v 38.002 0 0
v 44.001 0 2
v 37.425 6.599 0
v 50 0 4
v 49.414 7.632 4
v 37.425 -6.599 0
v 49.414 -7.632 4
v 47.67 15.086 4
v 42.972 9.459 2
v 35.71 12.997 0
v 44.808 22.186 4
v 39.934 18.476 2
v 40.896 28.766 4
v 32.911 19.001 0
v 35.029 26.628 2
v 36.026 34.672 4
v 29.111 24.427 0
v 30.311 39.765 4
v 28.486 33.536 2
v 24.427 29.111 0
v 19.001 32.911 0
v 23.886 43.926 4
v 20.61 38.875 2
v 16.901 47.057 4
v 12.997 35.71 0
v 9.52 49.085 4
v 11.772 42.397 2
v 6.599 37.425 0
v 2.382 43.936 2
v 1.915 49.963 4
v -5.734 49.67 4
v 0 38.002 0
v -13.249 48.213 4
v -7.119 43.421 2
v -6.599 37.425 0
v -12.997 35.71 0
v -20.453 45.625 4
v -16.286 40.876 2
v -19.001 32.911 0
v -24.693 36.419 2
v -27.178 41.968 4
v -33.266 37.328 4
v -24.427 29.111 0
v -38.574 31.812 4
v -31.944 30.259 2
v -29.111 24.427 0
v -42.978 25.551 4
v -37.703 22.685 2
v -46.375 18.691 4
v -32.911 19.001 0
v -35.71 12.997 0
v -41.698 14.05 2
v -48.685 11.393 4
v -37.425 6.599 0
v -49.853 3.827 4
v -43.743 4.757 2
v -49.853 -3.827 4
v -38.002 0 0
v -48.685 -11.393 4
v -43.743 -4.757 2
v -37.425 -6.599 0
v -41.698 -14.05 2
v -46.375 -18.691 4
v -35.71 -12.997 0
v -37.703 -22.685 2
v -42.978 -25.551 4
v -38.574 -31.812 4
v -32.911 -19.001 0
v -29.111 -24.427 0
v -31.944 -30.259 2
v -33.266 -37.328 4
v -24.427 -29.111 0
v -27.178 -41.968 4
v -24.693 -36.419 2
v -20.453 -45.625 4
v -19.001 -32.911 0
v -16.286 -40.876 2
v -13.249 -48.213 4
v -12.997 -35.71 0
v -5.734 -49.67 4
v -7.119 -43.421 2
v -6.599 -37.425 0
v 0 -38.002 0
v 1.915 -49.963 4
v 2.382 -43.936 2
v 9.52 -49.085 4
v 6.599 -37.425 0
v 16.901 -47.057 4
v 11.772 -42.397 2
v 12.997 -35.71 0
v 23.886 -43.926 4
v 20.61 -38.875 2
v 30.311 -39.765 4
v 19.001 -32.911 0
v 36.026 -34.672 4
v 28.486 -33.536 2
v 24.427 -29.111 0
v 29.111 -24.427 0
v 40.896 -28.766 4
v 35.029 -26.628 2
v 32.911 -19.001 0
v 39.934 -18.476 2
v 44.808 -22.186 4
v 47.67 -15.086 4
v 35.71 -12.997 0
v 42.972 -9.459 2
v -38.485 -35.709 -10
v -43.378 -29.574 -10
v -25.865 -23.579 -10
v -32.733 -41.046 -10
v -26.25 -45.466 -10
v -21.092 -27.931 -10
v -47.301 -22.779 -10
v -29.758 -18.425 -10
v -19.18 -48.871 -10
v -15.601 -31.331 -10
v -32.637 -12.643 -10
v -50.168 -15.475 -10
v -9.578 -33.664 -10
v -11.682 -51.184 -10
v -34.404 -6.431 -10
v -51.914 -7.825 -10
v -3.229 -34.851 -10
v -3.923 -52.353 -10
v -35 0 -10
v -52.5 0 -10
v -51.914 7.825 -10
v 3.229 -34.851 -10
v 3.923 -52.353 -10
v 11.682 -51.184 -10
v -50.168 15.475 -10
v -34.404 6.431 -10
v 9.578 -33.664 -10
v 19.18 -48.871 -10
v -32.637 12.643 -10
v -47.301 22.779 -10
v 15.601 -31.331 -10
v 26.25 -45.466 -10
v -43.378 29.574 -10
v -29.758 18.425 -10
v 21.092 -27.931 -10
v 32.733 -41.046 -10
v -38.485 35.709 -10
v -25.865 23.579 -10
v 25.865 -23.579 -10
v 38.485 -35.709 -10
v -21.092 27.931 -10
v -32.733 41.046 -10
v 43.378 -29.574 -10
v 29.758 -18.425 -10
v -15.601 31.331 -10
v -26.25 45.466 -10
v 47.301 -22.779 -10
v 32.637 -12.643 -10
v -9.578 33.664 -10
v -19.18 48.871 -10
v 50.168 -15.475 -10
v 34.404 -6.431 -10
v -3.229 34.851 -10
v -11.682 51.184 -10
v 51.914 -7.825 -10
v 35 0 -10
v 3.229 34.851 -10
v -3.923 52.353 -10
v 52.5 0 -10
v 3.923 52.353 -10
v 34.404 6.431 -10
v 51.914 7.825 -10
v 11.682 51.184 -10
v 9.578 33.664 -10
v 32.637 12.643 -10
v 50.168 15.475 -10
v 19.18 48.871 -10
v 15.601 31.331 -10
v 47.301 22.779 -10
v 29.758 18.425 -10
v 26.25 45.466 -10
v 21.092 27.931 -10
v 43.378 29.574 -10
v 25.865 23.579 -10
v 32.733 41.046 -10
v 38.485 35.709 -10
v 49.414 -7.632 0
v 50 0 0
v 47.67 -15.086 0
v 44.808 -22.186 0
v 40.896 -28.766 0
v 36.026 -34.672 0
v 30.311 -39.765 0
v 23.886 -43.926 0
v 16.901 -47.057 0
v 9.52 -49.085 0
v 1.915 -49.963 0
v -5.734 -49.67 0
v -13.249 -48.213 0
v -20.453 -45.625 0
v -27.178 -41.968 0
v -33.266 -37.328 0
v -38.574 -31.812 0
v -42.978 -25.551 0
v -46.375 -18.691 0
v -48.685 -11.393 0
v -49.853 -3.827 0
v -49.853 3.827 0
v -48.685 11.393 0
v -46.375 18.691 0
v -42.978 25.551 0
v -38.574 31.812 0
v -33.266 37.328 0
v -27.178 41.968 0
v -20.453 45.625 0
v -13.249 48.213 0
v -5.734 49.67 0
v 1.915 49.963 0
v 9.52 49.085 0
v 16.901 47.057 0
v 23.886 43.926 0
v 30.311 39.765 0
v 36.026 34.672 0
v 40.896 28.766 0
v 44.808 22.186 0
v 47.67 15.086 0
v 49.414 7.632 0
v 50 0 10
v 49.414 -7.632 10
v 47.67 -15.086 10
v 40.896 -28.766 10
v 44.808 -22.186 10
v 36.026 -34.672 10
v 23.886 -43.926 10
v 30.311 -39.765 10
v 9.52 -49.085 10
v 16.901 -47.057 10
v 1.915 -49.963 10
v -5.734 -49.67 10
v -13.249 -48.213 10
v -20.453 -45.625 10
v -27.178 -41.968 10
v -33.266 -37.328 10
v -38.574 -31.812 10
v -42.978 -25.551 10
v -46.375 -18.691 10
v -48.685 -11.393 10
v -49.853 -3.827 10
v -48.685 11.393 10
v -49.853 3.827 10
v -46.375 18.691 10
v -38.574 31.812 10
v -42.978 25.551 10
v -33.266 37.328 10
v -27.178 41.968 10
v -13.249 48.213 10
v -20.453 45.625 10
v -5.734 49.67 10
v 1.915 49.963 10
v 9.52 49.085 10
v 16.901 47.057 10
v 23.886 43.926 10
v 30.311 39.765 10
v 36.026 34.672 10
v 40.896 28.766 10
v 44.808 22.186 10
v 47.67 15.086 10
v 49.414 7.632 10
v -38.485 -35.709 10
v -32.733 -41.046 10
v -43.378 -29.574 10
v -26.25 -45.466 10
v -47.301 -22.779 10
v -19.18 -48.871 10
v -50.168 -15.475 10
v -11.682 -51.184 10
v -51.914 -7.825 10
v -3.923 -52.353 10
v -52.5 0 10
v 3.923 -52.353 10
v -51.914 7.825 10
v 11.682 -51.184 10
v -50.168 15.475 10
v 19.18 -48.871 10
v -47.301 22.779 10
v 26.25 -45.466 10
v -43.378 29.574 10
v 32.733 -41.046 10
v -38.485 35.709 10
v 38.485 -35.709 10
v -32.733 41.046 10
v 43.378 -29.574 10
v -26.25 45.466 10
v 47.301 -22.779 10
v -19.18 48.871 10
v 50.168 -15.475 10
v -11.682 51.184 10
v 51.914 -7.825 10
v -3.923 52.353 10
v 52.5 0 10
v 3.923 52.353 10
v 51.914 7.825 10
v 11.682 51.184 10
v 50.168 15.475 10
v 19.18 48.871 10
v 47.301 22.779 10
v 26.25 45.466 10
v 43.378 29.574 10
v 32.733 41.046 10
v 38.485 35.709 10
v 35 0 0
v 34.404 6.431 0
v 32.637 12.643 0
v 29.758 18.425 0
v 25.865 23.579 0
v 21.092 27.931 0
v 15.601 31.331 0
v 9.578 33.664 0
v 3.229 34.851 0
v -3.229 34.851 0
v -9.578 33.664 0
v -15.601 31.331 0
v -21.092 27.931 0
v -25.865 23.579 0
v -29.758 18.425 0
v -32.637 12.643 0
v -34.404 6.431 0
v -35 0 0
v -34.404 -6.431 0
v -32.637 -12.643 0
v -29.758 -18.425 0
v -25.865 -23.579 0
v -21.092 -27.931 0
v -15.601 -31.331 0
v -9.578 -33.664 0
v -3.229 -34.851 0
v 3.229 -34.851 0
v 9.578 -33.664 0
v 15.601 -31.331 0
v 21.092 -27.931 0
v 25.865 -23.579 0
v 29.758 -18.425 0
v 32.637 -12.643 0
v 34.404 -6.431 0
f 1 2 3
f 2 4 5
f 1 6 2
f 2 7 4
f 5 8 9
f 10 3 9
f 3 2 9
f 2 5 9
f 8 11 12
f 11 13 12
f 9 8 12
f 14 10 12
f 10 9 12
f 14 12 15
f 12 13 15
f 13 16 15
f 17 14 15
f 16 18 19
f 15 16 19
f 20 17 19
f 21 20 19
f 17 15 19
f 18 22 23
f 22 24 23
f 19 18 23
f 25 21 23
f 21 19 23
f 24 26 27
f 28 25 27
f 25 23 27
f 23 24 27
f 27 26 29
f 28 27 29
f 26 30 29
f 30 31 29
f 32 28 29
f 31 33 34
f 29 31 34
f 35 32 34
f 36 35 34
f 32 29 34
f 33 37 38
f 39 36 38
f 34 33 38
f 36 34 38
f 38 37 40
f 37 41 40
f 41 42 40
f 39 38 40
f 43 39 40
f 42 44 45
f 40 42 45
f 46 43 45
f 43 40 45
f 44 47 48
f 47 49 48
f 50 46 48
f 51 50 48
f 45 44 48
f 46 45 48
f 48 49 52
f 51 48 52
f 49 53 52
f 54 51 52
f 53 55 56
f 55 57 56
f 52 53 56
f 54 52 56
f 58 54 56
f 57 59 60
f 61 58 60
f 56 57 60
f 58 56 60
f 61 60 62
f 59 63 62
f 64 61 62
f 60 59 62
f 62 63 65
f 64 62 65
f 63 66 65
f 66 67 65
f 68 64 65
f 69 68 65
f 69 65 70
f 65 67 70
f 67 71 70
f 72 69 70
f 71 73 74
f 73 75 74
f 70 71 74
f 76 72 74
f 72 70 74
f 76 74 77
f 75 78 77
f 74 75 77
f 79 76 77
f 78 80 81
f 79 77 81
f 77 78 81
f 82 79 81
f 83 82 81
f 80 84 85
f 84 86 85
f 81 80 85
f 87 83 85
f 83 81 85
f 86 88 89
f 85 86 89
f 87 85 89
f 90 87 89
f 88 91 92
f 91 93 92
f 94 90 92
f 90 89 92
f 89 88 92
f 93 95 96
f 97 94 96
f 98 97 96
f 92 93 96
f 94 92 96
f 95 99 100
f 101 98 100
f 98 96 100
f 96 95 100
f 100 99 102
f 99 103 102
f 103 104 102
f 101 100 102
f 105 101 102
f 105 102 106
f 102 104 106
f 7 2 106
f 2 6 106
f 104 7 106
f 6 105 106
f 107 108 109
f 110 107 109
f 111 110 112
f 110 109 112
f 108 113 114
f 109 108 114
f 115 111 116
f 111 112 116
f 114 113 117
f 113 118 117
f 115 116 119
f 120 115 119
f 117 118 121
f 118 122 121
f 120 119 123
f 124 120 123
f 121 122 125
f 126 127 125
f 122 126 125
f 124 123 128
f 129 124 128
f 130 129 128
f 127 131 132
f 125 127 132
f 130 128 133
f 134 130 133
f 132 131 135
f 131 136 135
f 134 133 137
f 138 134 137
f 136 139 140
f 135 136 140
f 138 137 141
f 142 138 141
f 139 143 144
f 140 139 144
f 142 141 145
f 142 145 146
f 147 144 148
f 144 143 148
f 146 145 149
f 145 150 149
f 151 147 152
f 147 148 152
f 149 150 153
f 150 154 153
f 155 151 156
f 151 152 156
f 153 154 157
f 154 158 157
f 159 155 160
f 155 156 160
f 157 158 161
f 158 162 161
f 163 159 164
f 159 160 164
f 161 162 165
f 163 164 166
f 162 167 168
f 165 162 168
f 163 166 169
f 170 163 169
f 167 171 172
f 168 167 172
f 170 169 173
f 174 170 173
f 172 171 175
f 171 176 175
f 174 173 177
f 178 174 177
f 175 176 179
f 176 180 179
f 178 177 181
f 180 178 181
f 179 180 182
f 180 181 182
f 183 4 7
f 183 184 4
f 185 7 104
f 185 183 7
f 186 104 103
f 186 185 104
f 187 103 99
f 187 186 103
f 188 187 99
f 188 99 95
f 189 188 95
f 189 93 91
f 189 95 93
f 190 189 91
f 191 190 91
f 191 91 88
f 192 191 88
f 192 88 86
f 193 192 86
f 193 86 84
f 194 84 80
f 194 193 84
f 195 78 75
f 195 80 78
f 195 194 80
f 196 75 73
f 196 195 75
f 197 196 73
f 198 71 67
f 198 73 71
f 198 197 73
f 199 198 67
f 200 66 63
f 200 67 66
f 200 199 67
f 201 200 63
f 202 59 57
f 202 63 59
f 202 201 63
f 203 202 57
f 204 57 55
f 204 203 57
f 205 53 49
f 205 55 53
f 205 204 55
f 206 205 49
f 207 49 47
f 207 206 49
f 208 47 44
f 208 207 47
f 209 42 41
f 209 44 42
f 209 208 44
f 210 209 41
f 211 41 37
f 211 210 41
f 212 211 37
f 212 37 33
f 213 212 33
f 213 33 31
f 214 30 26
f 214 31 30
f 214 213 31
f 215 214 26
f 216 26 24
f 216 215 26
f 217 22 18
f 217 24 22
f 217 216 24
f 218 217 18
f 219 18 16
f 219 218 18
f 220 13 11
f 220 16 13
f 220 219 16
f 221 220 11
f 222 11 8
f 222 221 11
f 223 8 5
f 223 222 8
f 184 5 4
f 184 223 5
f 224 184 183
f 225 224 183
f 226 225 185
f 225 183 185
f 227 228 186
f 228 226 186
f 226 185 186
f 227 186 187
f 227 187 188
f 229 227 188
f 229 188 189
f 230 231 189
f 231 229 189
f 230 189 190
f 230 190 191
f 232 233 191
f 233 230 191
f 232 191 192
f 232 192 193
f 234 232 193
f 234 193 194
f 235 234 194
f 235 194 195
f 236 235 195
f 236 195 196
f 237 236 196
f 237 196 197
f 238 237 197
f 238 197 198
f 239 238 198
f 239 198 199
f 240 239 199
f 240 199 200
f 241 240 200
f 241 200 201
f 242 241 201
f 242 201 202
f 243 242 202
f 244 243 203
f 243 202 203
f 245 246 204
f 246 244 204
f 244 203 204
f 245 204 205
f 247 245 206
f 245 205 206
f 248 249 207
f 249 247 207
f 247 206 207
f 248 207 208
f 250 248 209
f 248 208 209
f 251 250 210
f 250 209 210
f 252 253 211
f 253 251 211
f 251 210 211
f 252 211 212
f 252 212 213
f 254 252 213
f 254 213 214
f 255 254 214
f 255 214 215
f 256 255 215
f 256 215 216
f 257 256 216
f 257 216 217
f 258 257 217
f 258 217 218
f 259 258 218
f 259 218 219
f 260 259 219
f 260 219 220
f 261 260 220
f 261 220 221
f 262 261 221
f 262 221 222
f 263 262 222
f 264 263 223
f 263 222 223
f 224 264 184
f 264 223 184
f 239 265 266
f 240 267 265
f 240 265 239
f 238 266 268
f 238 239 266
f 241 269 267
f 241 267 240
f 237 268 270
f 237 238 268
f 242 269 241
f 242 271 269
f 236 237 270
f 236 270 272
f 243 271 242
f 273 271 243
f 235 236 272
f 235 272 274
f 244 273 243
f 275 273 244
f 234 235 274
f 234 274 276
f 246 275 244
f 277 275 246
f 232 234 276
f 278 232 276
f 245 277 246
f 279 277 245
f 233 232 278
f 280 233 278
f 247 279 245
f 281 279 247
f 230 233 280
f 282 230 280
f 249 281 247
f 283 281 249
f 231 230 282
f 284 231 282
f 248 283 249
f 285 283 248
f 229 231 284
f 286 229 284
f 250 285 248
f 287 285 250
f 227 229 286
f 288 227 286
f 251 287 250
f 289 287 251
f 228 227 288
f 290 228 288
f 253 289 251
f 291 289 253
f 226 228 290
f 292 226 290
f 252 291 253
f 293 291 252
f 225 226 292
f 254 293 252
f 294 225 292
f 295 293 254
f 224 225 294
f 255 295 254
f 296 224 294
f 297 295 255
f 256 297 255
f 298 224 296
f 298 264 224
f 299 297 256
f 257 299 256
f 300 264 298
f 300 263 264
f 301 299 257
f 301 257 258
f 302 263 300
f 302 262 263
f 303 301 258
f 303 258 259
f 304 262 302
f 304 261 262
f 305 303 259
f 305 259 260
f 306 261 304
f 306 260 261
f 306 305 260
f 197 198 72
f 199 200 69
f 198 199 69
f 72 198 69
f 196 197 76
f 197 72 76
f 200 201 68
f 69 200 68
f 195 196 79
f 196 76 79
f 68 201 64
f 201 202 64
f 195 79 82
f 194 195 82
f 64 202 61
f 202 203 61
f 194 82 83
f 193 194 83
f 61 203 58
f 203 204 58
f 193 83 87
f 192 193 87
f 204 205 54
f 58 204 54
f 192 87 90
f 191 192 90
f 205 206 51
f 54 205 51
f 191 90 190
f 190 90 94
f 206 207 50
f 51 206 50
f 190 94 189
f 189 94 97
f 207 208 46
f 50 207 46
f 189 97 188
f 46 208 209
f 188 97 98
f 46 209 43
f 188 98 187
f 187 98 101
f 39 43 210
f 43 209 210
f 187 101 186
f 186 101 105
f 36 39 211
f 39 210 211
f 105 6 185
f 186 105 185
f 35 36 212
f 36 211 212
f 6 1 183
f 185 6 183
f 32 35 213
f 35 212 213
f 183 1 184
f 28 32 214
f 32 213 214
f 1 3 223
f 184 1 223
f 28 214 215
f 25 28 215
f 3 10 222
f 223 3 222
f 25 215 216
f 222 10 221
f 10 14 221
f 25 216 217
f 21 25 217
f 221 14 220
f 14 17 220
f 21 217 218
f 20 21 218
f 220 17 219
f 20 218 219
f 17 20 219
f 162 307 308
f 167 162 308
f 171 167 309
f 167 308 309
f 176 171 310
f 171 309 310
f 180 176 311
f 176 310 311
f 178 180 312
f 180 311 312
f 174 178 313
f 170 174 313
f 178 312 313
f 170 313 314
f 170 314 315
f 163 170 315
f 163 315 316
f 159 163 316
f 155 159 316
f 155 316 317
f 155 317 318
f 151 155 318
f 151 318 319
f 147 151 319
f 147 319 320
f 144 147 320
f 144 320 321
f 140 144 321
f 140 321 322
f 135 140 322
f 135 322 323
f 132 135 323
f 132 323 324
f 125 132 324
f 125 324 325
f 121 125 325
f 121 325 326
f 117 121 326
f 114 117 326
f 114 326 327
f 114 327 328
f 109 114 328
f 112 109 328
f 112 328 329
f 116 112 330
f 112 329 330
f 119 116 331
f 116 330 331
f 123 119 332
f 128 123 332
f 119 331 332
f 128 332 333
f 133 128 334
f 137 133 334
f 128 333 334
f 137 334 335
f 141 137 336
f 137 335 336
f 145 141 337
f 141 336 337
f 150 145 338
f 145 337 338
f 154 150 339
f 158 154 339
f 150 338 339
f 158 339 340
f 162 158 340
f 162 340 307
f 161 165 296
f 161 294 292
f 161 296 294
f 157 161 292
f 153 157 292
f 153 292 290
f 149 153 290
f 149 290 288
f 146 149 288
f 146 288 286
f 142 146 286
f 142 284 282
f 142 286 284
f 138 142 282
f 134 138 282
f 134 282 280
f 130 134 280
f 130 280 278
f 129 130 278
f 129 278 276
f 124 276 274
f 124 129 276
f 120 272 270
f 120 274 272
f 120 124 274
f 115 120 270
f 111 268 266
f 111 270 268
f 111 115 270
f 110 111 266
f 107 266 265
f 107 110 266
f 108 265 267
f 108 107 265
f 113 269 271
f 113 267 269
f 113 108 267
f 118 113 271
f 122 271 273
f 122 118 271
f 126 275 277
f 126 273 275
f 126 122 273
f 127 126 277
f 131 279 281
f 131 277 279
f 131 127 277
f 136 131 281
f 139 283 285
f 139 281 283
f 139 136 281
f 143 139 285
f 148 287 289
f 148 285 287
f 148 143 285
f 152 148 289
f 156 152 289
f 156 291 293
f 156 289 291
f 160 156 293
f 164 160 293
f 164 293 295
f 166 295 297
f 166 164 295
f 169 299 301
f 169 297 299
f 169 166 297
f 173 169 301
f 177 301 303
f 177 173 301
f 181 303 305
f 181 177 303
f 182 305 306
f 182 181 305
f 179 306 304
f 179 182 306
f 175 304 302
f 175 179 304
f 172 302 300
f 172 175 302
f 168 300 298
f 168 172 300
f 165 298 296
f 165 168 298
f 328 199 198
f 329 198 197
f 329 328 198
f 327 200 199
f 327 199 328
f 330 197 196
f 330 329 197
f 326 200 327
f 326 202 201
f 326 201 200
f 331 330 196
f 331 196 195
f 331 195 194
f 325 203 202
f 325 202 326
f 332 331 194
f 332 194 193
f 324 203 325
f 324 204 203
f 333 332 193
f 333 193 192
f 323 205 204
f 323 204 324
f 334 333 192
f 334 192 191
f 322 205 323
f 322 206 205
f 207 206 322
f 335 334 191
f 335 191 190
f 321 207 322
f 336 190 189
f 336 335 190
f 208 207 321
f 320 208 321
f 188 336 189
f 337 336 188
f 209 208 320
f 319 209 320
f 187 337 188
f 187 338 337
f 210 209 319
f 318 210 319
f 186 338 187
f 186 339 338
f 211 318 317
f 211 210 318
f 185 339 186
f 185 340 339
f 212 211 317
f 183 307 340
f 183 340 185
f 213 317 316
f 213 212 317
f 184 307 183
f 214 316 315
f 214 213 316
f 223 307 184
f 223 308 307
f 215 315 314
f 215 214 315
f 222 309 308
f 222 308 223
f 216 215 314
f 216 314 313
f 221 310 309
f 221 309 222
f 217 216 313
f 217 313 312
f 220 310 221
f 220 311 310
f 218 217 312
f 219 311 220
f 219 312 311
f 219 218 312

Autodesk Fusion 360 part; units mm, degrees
sketch "スケッチ1" plane through (0, 0, 0) normal (0, 0, 1) x (1, 0, 0)
  circle A0 centre (0, 0) radius 52.5
  circle A1 centre (0, 0) radius 50
  dimension "d1" = 105
  dimension "d2" = 100
extrude "押し出し1" add sketch "スケッチ1" along normal blind 7 makes body 1
sketch "スケッチ2" plane through (0, 0, 0) normal (0, 0, 1) x (1, 0, 0)
  circle A0 centre (0, 0) radius 52.5
  circle A1 centre (0, 0) radius 35
  dimension "d5" = 105
  dimension "d6" = 70
extrude "押し出し2" add sketch "スケッチ2" against normal blind 15 bodies 1
extrude "押し出し3" add 1 faces at (51.2851, -5.0923, 7) along direction (0, 0, 1) blind 2 on bodies 1 bodies 1
extrude "押し出し4" add 1 faces at (51.2851, -5.0923, 9) along direction (0, 0, 1) blind 1 on bodies 1 bodies 1
extrude "押し出し5" cut 1 faces at (46.4712, -2.6082, -15) along direction (0, 0, 1) blind 5 on bodies 1 bodies 1
sketch "スケッチ3" plane through (0, 0, 0) normal (0, 1, 0) x (1, 0, 0)
  line L0 (50, 0) -> (38.0019, 0)
  line L1 (50, -4) -> (50, 0)
  line L2 (50, -4) -> (38.0019, 0)
  dimension "d16" = 4
revolve "回転1" add sketch "スケッチ3" angle 360 about axis through (0, 0, 1.75) along (0, 0, 1) separate body makes body 2
